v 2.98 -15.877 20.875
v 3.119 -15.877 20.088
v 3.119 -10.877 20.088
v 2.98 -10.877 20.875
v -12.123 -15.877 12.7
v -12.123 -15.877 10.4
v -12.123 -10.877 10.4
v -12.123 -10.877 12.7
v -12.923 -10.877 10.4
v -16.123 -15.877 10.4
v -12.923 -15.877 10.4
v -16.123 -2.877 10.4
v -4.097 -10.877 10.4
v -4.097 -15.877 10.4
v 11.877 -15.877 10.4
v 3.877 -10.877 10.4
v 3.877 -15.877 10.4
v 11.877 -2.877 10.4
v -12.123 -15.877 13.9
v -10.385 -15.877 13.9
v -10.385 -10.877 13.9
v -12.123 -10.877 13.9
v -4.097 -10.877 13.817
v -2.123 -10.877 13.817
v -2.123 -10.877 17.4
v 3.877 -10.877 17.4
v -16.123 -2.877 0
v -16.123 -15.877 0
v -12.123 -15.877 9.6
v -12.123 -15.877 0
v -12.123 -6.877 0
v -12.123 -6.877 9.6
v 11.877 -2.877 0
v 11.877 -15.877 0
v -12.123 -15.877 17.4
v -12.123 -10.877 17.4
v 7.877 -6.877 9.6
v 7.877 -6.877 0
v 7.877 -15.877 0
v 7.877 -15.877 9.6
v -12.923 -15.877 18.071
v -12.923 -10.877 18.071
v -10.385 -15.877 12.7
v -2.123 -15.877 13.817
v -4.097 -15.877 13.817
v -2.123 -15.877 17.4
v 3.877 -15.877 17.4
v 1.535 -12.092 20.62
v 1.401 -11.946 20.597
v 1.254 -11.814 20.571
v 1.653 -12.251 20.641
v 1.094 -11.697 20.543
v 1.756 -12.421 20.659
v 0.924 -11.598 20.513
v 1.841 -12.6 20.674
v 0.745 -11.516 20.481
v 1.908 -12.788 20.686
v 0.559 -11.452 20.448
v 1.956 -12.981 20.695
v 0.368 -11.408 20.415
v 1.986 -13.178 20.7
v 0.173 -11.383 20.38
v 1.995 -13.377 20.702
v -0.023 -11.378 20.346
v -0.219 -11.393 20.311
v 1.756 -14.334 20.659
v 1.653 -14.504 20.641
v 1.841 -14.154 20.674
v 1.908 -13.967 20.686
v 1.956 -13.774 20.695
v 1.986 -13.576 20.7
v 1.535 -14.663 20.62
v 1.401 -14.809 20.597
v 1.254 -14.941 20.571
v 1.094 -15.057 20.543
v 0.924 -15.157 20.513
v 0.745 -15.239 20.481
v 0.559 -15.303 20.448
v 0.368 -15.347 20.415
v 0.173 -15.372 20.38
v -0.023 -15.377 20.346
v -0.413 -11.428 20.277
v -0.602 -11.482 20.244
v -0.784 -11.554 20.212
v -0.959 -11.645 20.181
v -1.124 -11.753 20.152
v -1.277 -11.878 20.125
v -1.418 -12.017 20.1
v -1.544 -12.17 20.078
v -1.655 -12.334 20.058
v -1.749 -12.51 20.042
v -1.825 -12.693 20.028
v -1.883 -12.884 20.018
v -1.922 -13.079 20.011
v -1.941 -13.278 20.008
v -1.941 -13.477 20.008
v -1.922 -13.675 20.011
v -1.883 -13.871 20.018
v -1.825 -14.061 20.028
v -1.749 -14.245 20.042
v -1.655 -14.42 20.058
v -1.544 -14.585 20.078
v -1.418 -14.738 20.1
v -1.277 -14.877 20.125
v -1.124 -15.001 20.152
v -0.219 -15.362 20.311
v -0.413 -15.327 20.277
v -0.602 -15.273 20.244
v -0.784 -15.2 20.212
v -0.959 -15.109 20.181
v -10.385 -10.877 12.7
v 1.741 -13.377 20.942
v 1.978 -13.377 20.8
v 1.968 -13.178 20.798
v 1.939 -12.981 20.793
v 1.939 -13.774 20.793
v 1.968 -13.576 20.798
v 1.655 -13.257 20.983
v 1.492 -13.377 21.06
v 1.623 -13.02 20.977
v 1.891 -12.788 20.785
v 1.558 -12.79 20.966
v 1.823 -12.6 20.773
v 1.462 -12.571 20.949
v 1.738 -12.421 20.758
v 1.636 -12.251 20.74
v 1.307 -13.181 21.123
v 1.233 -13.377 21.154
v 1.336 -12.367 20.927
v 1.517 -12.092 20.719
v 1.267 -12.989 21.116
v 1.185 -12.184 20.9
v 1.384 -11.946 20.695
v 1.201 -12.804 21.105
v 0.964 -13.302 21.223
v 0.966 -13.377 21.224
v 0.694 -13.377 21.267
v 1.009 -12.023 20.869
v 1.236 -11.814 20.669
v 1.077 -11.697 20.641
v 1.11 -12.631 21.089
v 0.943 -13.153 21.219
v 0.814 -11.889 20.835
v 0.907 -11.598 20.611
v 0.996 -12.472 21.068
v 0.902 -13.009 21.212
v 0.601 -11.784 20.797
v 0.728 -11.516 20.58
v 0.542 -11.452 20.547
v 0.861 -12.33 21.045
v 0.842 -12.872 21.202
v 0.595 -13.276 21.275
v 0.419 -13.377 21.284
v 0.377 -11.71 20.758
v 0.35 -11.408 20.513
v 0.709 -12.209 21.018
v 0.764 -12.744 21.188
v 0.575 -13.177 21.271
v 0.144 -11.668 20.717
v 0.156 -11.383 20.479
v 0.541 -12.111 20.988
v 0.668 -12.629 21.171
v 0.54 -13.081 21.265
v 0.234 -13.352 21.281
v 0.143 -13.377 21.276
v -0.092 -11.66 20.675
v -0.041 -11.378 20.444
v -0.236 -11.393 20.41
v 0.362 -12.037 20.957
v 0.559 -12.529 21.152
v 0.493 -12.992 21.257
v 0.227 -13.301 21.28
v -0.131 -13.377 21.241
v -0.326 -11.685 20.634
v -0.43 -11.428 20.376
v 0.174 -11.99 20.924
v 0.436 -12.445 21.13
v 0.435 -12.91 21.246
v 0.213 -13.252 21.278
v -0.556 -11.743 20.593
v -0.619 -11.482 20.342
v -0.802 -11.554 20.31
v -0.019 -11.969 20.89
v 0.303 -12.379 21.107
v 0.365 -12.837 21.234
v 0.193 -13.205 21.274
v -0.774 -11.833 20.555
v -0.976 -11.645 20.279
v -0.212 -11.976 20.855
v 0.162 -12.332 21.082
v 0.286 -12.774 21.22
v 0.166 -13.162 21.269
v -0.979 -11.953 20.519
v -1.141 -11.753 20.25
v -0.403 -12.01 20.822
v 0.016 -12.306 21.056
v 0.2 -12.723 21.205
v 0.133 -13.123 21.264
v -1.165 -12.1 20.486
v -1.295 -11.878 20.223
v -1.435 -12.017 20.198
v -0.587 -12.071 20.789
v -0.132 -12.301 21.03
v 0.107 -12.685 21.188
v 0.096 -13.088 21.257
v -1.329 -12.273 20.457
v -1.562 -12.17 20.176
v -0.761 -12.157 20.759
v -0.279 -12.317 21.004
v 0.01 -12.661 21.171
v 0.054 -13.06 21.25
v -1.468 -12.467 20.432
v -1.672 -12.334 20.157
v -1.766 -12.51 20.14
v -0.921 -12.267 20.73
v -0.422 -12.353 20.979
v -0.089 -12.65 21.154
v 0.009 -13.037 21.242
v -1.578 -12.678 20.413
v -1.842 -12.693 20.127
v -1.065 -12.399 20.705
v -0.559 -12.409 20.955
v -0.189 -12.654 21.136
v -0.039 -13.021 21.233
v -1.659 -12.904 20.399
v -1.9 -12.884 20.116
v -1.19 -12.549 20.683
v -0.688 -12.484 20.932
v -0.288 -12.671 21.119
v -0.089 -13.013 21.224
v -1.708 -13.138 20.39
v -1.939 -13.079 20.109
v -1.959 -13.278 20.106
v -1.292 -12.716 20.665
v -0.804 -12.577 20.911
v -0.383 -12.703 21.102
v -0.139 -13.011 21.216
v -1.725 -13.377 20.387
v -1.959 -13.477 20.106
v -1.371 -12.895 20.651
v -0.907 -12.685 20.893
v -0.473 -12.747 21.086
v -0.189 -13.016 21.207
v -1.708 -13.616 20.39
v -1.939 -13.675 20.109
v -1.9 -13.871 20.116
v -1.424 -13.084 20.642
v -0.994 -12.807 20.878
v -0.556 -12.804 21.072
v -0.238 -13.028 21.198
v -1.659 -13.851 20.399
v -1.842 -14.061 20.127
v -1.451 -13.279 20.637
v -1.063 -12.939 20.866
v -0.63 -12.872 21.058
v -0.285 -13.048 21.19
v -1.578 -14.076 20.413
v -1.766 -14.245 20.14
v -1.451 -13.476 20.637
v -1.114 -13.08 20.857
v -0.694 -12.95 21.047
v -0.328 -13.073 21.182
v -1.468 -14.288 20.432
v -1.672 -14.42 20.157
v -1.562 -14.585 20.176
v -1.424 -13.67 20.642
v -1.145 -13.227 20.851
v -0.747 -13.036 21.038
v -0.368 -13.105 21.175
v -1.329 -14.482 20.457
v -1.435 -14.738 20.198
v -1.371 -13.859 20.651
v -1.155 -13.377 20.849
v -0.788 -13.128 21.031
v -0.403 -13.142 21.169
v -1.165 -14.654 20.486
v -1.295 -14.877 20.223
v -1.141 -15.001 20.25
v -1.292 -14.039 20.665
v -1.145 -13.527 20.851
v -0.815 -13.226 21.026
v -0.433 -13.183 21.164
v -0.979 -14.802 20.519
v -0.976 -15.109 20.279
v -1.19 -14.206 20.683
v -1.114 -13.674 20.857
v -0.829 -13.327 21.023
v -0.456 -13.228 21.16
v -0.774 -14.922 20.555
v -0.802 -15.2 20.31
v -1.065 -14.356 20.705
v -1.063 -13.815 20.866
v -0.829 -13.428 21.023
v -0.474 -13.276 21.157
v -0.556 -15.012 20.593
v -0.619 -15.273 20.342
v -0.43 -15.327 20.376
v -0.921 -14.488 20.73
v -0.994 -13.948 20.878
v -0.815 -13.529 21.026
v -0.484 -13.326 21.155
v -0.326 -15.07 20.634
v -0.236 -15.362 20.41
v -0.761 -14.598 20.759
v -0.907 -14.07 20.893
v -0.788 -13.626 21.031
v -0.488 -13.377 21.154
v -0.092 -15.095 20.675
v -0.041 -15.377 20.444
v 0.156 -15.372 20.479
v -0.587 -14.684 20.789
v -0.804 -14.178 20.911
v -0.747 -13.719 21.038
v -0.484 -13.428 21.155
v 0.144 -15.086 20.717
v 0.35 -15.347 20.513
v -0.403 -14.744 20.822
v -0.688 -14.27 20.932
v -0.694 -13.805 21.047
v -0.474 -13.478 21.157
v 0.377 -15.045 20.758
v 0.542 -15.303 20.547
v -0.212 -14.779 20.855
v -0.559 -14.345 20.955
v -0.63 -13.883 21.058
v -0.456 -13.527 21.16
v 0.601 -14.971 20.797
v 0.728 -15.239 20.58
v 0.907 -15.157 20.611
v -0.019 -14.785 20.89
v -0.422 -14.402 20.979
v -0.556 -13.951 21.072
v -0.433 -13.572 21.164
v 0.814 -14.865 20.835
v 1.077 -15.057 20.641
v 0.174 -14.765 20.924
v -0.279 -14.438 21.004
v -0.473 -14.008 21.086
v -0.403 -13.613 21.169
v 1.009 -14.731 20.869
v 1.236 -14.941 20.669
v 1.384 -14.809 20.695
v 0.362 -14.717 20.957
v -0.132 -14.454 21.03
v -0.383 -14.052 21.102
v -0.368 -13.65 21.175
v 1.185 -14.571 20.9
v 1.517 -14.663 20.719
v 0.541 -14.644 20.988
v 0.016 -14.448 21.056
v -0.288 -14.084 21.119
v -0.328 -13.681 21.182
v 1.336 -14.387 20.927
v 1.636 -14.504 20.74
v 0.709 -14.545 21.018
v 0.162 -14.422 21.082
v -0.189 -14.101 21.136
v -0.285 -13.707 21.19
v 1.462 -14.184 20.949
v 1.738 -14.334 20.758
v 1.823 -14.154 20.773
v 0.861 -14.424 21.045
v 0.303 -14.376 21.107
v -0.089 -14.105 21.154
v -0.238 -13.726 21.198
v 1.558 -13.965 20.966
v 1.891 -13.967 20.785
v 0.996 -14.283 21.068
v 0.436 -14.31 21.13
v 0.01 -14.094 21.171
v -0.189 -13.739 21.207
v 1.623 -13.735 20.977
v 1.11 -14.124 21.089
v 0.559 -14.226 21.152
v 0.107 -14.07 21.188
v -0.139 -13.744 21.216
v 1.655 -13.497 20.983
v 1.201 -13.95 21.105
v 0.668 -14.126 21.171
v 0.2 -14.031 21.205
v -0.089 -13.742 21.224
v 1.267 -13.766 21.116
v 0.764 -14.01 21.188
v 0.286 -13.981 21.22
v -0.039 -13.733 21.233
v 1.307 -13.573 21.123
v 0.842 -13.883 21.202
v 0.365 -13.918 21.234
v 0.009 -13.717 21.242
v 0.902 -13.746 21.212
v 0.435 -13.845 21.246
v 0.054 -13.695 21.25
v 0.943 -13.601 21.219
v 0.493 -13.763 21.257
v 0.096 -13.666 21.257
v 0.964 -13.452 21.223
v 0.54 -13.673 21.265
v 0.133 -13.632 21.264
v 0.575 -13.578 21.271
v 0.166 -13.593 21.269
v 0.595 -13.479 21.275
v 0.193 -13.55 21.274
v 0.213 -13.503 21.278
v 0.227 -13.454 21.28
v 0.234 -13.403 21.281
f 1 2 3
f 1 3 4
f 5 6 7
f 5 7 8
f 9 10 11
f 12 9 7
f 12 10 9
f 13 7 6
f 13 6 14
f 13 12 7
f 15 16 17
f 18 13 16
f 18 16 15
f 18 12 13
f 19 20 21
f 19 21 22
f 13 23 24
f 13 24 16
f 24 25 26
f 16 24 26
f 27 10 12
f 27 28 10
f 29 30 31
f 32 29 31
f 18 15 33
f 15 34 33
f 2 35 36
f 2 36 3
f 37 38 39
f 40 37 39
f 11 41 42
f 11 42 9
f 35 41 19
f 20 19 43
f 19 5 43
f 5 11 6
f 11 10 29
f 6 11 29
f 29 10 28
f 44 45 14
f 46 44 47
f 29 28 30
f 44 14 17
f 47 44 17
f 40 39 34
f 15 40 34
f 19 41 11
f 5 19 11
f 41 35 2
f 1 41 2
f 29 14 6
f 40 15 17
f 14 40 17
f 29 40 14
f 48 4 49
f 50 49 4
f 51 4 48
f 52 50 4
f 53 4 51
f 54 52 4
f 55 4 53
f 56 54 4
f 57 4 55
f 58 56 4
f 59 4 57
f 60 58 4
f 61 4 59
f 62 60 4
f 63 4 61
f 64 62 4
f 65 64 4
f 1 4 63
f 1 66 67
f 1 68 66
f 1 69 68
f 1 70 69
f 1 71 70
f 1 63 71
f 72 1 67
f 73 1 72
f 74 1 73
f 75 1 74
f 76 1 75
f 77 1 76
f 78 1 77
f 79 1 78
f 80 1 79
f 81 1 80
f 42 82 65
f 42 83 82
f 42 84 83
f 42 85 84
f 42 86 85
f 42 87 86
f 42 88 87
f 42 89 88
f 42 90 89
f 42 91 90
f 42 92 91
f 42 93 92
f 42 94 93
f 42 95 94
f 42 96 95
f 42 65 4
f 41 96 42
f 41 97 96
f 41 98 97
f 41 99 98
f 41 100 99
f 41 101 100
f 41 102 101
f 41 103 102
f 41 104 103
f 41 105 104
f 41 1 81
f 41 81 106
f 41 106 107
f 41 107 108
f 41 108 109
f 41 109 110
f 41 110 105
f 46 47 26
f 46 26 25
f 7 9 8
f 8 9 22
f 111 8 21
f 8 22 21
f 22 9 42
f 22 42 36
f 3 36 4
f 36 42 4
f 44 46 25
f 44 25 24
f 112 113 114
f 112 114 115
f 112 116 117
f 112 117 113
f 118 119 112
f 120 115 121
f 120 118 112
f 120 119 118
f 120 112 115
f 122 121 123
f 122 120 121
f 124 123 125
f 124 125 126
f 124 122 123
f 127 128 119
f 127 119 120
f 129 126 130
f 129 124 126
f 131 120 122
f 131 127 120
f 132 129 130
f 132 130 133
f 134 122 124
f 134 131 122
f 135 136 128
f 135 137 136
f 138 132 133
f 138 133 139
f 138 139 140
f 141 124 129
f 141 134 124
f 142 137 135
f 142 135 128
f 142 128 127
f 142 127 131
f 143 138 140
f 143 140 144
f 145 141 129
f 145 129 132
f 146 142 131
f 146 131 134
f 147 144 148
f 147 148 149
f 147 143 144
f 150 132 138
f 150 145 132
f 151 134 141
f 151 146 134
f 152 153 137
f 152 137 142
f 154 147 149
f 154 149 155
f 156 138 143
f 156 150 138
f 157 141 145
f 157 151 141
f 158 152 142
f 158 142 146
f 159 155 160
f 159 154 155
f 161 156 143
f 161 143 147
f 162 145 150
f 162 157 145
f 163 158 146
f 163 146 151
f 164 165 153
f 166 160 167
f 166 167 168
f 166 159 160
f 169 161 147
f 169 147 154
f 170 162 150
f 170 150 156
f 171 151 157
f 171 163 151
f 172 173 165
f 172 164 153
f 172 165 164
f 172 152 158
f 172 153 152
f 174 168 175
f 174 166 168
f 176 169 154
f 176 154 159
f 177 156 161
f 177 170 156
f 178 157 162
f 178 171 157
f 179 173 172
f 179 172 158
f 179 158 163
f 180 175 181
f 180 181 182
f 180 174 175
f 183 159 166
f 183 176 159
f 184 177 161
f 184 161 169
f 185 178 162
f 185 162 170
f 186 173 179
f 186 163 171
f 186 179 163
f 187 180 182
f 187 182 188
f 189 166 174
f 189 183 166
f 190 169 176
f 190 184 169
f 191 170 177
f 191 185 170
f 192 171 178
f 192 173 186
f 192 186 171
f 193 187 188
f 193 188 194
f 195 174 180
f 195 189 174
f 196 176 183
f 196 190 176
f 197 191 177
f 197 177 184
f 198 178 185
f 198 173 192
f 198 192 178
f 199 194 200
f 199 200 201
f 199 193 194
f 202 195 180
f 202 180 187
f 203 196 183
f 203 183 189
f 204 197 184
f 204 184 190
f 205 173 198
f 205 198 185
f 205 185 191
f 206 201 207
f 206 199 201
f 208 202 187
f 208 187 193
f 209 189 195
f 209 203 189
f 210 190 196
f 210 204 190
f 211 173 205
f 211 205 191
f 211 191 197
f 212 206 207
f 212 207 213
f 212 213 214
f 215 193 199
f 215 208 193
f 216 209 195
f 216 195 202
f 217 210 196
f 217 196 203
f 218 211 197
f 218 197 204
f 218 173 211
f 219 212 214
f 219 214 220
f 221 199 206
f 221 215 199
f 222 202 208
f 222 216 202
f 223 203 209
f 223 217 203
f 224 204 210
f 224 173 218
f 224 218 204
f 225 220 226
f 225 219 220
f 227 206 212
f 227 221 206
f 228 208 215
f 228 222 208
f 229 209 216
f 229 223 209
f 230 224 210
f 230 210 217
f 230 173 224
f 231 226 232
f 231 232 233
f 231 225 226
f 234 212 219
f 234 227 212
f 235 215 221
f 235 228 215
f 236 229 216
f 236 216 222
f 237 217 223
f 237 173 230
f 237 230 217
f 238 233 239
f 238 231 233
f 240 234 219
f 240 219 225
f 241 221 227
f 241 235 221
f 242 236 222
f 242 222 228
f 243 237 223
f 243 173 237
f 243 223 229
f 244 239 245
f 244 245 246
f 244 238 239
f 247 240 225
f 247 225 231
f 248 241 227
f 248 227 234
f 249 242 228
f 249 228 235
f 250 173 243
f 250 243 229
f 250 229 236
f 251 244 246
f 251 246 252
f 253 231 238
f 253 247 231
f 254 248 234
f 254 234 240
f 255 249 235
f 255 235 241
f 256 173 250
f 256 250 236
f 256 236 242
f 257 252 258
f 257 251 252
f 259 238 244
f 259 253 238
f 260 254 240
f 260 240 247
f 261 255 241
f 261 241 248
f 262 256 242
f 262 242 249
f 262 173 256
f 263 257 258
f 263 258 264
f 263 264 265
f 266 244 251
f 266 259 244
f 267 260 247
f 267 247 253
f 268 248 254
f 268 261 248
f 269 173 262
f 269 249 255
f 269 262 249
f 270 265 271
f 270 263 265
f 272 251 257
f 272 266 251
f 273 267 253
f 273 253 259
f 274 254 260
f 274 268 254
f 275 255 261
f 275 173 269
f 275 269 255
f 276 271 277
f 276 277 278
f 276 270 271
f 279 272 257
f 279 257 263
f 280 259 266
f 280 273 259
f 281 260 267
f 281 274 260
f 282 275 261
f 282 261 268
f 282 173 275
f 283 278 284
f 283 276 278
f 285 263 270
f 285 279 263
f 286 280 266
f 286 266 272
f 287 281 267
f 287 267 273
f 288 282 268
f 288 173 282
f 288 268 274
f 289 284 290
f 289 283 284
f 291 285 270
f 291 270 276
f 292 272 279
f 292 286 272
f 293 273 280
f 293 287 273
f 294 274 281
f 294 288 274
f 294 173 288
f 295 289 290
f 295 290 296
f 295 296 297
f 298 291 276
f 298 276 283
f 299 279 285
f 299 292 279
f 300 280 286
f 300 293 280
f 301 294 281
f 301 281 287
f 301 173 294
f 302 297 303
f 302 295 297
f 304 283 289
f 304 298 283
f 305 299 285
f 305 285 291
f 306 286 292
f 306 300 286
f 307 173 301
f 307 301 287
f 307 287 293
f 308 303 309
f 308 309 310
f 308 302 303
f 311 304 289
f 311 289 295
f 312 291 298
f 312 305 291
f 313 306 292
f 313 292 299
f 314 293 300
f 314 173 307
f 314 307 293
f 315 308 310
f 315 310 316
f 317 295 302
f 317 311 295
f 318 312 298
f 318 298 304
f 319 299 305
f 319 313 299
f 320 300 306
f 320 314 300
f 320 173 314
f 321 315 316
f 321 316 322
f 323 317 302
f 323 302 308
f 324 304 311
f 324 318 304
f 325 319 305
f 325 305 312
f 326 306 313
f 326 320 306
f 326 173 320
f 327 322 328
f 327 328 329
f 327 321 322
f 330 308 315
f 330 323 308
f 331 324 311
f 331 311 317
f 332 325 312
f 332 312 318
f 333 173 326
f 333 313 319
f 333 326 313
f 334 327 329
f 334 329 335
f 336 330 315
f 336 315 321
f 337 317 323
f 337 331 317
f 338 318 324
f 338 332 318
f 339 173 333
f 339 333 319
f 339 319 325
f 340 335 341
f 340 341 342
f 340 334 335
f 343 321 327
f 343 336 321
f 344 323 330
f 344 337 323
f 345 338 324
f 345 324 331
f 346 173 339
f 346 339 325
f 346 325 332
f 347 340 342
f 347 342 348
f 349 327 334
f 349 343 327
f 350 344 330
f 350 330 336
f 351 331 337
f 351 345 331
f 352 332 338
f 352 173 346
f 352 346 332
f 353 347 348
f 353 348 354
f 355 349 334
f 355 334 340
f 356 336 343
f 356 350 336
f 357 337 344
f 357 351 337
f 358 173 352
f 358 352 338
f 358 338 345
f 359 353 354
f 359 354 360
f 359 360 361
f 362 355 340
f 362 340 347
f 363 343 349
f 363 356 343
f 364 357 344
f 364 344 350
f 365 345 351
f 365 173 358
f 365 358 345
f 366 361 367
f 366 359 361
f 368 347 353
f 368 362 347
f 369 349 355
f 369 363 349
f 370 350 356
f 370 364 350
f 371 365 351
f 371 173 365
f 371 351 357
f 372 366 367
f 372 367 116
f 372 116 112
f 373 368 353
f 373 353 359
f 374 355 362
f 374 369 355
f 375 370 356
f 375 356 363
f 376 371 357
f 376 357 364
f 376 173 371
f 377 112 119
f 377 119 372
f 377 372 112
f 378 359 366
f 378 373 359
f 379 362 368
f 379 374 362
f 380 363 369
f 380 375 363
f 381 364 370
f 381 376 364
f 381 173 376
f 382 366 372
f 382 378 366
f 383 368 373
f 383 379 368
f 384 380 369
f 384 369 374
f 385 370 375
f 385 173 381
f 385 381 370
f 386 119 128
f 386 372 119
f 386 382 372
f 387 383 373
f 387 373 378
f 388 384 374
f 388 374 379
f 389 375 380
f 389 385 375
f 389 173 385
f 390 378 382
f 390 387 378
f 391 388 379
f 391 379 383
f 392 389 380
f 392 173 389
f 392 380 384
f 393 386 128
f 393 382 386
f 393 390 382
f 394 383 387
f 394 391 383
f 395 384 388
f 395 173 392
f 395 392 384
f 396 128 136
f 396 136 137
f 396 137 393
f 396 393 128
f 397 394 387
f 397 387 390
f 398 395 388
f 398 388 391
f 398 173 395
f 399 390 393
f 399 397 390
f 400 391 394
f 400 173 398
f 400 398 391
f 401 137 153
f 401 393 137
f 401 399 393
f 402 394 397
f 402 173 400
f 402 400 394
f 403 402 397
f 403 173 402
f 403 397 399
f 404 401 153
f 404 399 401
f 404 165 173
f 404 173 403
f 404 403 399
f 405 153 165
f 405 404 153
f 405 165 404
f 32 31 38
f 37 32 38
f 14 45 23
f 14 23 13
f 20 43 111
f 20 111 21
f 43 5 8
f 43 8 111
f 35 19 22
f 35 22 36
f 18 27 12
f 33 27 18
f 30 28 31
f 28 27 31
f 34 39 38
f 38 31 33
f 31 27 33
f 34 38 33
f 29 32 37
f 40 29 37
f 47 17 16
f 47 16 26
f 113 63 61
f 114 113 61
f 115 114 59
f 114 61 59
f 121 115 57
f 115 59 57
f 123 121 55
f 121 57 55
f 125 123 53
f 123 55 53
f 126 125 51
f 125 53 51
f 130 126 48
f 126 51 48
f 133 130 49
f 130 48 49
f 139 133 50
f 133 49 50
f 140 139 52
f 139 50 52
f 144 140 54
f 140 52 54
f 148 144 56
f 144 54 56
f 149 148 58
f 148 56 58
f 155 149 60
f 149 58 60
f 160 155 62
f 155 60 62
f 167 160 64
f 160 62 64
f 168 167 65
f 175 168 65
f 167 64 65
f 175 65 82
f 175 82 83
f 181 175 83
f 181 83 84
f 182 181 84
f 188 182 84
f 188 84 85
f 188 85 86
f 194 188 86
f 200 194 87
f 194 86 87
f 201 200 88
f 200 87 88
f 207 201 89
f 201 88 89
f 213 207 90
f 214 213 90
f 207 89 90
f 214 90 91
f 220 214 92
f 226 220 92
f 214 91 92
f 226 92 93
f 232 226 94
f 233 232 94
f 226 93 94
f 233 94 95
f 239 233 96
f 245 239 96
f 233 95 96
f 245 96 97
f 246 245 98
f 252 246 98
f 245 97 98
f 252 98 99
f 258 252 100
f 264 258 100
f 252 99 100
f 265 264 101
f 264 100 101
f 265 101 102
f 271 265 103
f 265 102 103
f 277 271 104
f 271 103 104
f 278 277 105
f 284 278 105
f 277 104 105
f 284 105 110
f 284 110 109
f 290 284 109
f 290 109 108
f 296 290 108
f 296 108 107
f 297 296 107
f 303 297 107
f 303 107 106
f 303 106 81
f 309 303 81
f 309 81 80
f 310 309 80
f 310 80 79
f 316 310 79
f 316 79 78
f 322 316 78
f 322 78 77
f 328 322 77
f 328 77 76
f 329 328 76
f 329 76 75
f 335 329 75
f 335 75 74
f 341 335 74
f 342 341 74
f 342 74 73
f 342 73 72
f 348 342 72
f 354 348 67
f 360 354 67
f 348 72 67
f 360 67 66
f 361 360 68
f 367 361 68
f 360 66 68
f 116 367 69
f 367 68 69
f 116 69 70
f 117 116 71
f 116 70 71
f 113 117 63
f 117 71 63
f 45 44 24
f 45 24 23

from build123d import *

# Parameters (mm, degrees)
BOSS_EXTRUDE1_DEPTH = 9.6
SKETCH2_W           = 28
SKETCH2_H           = 13
BOSS_EXTRUDE2_DEPTH = 0.8
BOSS_EXTRUDE3_DEPTH = 5
SKETCH4_R           = 2
BOSS_EXTRUDE4_DEPTH = 0.1
DOME1_FACE_RADIUS   = 2
DOME1_HEIGHT        = 0.8


with BuildPart() as part:
    # Sketch1 → Boss-Extrude1 (new body)
    with BuildSketch(Plane.XY):
        Polygon((-16.122641509, -15.877358491), (-12.122641509, -15.877358491), (-12.122641509, -6.877358491), (7.877358491, -6.877358491), (7.877358491, -15.877358491), (11.877358491, -15.877358491), (11.877358491, -2.877358491), (-16.122641509, -2.877358491), align=None)
    extrude(amount=BOSS_EXTRUDE1_DEPTH)

    # Sketch2 → Boss-Extrude2 (add)
    with BuildSketch(Plane.XY.offset(9.6)):
        with Locations((-2.122641509, -9.377358491)):
            Rectangle(SKETCH2_W, SKETCH2_H)
    extrude(amount=BOSS_EXTRUDE2_DEPTH)

    # Sketch3 → Boss-Extrude3 (add)
    with BuildSketch(Plane.XZ.offset(15.877358491)):
        Polygon((-4.096861334, 10.4), (3.877358491, 10.4), (3.877358491, 17.4), (-2.122641509, 17.4), (-2.122641509, 13.817479277), (-4.096861334, 13.817479277), align=None)
        Polygon((-12.122641509, 17.4), (3.119119142, 20.087533636), (2.9802006, 20.875379839), (-12.922641509, 18.071279705), (-12.922641509, 13.961837911), (-12.922641509, 10.4), (-12.122641509, 10.4), (-12.122641509, 12.7), (-10.384503435, 12.7), (-10.384503435, 13.9), (-12.122641509, 13.9), align=None)
    extrude(amount=-BOSS_EXTRUDE3_DEPTH)

    # Sketch4 → Boss-Extrude4 (add)
    with BuildSketch(Plane(origin=(-3.480036158, 0, 19.736265797), x_dir=(0.9848077530122085, 0, 0.17364817766692794), z_dir=(-0.17364817766692794, 0, 0.9848077530122085))):
        with Locations((3.559896323, -13.377358491)):
            Circle(SKETCH4_R)
    extrude(amount=BOSS_EXTRUDE4_DEPTH)

    # Dome1: a dome of height H over a round flat face of radius A is a cap of a sphere of radius (A * A + H * H) / (2 * H)
    dome1_r = (DOME1_FACE_RADIUS * DOME1_FACE_RADIUS + DOME1_HEIGHT * DOME1_HEIGHT) / (2 * DOME1_HEIGHT)
    dome1_base = Plane((0.008412523, -13.377358491, 20.452916081), z_dir=(-0.173648177667, 0, 0.984807753012))
    with Locations(dome1_base.offset(DOME1_HEIGHT - dome1_r)):
        dome1_ball = Sphere(dome1_r, mode=Mode.PRIVATE)
    add(split(dome1_ball, bisect_by=dome1_base, keep=Keep.TOP, mode=Mode.PRIVATE))


solid = part.part
